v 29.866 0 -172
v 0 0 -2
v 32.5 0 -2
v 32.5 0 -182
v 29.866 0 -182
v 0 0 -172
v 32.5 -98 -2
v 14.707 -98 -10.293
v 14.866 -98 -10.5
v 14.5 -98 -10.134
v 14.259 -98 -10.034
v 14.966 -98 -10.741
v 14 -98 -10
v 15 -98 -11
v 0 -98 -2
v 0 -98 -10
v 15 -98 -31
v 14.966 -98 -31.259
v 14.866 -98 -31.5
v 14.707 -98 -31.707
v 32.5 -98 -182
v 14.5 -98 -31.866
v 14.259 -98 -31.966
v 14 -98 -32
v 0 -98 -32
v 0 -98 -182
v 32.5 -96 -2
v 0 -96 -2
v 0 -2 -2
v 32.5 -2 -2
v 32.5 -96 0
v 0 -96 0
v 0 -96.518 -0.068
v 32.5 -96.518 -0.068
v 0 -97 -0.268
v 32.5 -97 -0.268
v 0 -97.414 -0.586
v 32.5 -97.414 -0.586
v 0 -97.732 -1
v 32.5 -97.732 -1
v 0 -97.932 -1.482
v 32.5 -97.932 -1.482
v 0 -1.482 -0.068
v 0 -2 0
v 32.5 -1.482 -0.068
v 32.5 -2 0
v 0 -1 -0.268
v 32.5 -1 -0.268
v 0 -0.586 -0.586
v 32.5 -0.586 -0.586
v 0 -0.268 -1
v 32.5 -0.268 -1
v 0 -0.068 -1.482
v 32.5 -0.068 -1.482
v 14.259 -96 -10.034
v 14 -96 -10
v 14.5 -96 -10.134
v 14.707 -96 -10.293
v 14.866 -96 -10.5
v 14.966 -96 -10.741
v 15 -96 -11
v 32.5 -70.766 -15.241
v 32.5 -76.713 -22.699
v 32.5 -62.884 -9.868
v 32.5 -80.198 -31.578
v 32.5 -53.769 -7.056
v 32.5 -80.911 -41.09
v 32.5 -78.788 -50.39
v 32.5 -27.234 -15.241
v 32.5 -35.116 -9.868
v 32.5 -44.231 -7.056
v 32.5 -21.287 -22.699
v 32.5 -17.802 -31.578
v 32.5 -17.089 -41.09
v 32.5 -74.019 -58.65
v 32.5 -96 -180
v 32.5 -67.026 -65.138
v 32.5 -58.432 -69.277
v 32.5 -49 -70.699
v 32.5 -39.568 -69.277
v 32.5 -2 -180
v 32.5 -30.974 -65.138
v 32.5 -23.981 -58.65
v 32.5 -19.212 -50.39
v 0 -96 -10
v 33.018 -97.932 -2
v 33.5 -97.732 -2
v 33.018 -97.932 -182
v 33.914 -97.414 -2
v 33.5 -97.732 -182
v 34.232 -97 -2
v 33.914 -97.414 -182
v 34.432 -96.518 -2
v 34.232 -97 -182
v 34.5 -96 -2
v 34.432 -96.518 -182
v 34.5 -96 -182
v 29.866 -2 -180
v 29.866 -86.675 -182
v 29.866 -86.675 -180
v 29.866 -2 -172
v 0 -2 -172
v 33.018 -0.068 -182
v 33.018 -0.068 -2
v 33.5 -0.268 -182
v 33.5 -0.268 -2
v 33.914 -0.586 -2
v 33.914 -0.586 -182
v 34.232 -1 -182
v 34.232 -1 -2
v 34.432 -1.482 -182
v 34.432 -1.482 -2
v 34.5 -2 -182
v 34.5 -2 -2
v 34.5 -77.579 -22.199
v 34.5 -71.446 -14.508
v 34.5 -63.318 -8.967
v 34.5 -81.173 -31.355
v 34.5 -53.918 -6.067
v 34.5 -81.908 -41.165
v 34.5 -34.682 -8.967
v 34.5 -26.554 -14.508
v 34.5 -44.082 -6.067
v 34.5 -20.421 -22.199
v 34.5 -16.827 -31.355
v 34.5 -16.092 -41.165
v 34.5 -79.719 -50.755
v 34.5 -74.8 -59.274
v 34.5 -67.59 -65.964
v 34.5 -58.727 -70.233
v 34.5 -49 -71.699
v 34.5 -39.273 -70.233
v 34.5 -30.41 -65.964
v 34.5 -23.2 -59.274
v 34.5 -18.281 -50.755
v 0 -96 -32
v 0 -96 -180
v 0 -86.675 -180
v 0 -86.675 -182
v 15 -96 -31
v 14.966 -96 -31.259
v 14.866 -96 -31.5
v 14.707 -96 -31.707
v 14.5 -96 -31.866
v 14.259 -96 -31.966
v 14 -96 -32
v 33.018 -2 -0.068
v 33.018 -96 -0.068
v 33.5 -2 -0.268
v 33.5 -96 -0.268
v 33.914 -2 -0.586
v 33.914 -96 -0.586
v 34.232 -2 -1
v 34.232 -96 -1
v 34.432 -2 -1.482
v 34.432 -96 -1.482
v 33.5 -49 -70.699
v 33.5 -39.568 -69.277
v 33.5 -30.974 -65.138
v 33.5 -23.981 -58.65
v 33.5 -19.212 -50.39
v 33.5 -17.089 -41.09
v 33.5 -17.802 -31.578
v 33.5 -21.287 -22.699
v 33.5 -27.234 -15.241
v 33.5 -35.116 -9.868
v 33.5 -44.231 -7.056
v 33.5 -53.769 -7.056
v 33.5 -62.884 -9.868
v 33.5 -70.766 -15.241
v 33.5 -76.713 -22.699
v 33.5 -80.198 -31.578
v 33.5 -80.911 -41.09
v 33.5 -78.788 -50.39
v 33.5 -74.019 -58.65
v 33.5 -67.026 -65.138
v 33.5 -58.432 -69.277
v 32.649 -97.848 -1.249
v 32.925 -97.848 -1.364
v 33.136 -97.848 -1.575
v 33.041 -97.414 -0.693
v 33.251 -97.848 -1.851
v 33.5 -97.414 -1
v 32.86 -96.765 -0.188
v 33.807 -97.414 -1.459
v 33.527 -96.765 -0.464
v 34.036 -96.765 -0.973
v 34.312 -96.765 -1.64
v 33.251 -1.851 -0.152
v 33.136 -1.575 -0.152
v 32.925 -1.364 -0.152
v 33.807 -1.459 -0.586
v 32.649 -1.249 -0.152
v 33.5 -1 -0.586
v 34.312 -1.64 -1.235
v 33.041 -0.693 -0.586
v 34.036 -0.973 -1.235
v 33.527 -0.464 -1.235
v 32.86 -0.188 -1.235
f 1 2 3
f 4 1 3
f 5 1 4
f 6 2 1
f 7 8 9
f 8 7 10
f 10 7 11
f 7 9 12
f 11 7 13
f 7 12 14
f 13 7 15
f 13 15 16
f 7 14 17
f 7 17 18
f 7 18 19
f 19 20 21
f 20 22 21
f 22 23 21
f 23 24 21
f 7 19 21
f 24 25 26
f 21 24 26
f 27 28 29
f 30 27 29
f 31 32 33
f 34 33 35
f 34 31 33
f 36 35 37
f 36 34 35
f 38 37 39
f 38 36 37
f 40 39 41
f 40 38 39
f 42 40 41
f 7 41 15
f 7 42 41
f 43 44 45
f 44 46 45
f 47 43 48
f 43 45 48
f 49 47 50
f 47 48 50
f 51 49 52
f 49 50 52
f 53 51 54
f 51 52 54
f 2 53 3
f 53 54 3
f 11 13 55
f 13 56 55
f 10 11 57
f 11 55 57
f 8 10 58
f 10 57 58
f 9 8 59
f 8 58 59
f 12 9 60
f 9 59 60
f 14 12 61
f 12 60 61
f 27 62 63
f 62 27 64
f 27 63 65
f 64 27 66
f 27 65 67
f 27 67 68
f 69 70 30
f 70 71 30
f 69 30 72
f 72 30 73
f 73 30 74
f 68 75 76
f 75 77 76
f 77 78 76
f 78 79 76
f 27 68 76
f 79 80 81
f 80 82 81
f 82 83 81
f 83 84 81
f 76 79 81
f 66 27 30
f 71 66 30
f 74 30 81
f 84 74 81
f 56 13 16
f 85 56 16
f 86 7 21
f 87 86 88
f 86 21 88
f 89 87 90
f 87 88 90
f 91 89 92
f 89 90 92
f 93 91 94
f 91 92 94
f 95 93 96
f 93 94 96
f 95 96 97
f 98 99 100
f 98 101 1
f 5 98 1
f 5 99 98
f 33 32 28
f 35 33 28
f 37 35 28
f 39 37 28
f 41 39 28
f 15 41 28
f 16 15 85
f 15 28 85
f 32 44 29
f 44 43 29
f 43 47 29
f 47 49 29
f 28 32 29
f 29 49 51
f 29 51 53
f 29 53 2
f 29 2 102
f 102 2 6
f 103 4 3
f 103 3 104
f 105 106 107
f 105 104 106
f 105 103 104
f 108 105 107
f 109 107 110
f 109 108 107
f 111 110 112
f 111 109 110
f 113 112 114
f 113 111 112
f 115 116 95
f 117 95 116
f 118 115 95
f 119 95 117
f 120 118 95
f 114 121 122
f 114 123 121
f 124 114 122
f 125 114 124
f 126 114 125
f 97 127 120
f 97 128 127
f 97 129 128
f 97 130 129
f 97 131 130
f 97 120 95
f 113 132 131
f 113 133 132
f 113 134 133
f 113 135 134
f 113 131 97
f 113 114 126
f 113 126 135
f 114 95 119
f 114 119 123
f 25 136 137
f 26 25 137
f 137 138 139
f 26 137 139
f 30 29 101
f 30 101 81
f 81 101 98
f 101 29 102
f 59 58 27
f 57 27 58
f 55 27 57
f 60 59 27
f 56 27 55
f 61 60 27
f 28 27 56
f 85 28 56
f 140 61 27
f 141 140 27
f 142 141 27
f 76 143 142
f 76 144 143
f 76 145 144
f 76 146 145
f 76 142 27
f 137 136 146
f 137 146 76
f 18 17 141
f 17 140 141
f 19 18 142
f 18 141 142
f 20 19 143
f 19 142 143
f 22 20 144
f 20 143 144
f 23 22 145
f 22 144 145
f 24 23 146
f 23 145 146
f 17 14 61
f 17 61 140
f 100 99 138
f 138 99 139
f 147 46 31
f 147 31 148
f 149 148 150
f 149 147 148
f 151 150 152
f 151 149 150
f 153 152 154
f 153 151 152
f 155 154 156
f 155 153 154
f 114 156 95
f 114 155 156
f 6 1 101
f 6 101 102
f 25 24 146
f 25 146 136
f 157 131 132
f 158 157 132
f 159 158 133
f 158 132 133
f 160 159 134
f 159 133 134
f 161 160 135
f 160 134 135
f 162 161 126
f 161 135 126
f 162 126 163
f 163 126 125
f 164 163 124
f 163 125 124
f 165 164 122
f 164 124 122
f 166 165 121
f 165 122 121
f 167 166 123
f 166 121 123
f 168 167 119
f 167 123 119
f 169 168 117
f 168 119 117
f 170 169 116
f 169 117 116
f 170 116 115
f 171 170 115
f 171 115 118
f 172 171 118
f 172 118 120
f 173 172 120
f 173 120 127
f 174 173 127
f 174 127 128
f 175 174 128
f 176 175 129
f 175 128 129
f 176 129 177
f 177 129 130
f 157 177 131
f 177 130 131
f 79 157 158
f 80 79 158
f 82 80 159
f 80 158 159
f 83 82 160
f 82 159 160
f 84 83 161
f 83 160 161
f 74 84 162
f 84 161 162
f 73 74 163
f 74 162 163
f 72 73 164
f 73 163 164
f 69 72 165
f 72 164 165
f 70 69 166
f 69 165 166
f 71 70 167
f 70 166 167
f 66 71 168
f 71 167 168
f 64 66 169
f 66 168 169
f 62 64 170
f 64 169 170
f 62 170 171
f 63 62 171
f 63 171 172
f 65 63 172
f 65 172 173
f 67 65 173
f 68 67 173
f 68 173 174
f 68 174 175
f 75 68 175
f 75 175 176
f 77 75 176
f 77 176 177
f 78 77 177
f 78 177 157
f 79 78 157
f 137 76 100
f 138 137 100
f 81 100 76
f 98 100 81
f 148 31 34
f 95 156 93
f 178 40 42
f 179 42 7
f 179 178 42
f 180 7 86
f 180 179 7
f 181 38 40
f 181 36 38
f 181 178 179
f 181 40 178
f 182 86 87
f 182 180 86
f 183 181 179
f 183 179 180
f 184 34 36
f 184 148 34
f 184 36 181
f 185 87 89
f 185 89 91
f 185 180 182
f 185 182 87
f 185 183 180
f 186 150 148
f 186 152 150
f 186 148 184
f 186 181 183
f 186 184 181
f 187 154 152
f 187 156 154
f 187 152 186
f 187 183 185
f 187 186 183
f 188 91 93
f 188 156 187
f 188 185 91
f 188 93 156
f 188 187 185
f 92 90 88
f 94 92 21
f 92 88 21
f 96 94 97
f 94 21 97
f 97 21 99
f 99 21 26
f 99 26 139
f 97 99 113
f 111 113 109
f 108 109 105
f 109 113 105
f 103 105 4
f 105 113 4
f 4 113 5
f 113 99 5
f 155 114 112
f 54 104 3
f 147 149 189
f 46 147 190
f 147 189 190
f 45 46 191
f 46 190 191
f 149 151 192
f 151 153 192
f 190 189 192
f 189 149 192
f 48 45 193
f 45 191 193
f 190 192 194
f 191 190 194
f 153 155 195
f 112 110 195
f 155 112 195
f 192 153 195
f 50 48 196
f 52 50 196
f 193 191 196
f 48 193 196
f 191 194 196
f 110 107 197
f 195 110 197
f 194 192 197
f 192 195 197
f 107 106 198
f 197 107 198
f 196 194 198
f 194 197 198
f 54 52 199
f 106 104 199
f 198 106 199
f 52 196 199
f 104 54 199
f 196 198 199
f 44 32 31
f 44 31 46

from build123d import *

# Parameters (mm, degrees)
SKETCH_1_W          = 182
SKETCH_1_H          = 98
EXTRUDE_1_DEPTH     = 34.5
SHELL_1_T           = -2
SKETCH_2_R          = 32
CUT_EXTRUDE_1_DEPTH = 10
SKETCH_3_W          = 29.866450527
SKETCH_3_H          = 86.675289488
CUT_EXTRUDE_2_DEPTH = 10
FILLET_1_R          = 2
SKETCH_4_W          = 15
SKETCH_4_H          = 22
CUT_EXTRUDE_3_DEPTH = 10
FILLET_2_R          = 1
CHAMFER_1_SIZE      = 1


with BuildPart() as part:
    # 草图1 → 凸台-拉伸1 (new body)
    with BuildSketch(Plane(origin=(0, 0, 0), x_dir=(0, 0, -1), z_dir=(1, 0, 0))):
        with Locations((91, -49)):
            Rectangle(SKETCH_1_W, SKETCH_1_H)
    extrude(amount=EXTRUDE_1_DEPTH)

    # 抽壳1
    shell_1_openings = [part.faces().sort_by_distance(p)[0] for p in [
        (0, -49, -91),
    ]]
    offset(amount=SHELL_1_T, openings=shell_1_openings, kind=Kind.INTERSECTION)

    # 草图2 → 切除-拉伸1 (cut)
    with BuildSketch(Plane(origin=(34.5, 0, 0), x_dir=(0, 0, -1), z_dir=(1, 0, 0))):
        with Locations((38.698604665, -49)):
            Circle(SKETCH_2_R)
    extrude(amount=-CUT_EXTRUDE_1_DEPTH, mode=Mode.SUBTRACT)

    # 草图3 → 切除-拉伸2 (cut)
    with BuildSketch(Plane(origin=(0, 0, -182), x_dir=(-1, 0, 0), z_dir=(0, 0, -1))):
        with Locations((-14.933225264, -43.337644744)):
            Rectangle(SKETCH_3_W, SKETCH_3_H)
    extrude(amount=-CUT_EXTRUDE_2_DEPTH, mode=Mode.SUBTRACT)

    # 圆角1
    fillet_1_edges = [part.edges().sort_by_distance(p)[0] for p in [
        (34.5, 0, -91),
        (34.5, -49, 0),
        (17.25, 0, 0),
        (17.25, -98, 0),
        (34.5, -98, -91),
    ]]
    fillet(fillet_1_edges, radius=FILLET_1_R)

    # 草图4 → 切除-拉伸3 (cut)
    with BuildSketch(Plane(origin=(0, -98, 0), x_dir=(-1, 0, 0), z_dir=(0, -1, 0))):
        with Locations((-7.5, 21)):
            Rectangle(SKETCH_4_W, SKETCH_4_H)
    extrude(amount=-CUT_EXTRUDE_3_DEPTH, mode=Mode.SUBTRACT)

    # 圆角2
    fillet_2_edges = [part.edges().sort_by_distance(p)[0] for p in [
        (15, -97, -10),
        (15, -97, -32),
    ]]
    fillet(fillet_2_edges, radius=FILLET_2_R)

    # 倒角1
    chamfer_1_edges = [part.edges().sort_by_distance(p)[0] for p in [
        (34.5, -49, -6.698604665),
    ]]
    chamfer(chamfer_1_edges, length=CHAMFER_1_SIZE)


solid = part.part
